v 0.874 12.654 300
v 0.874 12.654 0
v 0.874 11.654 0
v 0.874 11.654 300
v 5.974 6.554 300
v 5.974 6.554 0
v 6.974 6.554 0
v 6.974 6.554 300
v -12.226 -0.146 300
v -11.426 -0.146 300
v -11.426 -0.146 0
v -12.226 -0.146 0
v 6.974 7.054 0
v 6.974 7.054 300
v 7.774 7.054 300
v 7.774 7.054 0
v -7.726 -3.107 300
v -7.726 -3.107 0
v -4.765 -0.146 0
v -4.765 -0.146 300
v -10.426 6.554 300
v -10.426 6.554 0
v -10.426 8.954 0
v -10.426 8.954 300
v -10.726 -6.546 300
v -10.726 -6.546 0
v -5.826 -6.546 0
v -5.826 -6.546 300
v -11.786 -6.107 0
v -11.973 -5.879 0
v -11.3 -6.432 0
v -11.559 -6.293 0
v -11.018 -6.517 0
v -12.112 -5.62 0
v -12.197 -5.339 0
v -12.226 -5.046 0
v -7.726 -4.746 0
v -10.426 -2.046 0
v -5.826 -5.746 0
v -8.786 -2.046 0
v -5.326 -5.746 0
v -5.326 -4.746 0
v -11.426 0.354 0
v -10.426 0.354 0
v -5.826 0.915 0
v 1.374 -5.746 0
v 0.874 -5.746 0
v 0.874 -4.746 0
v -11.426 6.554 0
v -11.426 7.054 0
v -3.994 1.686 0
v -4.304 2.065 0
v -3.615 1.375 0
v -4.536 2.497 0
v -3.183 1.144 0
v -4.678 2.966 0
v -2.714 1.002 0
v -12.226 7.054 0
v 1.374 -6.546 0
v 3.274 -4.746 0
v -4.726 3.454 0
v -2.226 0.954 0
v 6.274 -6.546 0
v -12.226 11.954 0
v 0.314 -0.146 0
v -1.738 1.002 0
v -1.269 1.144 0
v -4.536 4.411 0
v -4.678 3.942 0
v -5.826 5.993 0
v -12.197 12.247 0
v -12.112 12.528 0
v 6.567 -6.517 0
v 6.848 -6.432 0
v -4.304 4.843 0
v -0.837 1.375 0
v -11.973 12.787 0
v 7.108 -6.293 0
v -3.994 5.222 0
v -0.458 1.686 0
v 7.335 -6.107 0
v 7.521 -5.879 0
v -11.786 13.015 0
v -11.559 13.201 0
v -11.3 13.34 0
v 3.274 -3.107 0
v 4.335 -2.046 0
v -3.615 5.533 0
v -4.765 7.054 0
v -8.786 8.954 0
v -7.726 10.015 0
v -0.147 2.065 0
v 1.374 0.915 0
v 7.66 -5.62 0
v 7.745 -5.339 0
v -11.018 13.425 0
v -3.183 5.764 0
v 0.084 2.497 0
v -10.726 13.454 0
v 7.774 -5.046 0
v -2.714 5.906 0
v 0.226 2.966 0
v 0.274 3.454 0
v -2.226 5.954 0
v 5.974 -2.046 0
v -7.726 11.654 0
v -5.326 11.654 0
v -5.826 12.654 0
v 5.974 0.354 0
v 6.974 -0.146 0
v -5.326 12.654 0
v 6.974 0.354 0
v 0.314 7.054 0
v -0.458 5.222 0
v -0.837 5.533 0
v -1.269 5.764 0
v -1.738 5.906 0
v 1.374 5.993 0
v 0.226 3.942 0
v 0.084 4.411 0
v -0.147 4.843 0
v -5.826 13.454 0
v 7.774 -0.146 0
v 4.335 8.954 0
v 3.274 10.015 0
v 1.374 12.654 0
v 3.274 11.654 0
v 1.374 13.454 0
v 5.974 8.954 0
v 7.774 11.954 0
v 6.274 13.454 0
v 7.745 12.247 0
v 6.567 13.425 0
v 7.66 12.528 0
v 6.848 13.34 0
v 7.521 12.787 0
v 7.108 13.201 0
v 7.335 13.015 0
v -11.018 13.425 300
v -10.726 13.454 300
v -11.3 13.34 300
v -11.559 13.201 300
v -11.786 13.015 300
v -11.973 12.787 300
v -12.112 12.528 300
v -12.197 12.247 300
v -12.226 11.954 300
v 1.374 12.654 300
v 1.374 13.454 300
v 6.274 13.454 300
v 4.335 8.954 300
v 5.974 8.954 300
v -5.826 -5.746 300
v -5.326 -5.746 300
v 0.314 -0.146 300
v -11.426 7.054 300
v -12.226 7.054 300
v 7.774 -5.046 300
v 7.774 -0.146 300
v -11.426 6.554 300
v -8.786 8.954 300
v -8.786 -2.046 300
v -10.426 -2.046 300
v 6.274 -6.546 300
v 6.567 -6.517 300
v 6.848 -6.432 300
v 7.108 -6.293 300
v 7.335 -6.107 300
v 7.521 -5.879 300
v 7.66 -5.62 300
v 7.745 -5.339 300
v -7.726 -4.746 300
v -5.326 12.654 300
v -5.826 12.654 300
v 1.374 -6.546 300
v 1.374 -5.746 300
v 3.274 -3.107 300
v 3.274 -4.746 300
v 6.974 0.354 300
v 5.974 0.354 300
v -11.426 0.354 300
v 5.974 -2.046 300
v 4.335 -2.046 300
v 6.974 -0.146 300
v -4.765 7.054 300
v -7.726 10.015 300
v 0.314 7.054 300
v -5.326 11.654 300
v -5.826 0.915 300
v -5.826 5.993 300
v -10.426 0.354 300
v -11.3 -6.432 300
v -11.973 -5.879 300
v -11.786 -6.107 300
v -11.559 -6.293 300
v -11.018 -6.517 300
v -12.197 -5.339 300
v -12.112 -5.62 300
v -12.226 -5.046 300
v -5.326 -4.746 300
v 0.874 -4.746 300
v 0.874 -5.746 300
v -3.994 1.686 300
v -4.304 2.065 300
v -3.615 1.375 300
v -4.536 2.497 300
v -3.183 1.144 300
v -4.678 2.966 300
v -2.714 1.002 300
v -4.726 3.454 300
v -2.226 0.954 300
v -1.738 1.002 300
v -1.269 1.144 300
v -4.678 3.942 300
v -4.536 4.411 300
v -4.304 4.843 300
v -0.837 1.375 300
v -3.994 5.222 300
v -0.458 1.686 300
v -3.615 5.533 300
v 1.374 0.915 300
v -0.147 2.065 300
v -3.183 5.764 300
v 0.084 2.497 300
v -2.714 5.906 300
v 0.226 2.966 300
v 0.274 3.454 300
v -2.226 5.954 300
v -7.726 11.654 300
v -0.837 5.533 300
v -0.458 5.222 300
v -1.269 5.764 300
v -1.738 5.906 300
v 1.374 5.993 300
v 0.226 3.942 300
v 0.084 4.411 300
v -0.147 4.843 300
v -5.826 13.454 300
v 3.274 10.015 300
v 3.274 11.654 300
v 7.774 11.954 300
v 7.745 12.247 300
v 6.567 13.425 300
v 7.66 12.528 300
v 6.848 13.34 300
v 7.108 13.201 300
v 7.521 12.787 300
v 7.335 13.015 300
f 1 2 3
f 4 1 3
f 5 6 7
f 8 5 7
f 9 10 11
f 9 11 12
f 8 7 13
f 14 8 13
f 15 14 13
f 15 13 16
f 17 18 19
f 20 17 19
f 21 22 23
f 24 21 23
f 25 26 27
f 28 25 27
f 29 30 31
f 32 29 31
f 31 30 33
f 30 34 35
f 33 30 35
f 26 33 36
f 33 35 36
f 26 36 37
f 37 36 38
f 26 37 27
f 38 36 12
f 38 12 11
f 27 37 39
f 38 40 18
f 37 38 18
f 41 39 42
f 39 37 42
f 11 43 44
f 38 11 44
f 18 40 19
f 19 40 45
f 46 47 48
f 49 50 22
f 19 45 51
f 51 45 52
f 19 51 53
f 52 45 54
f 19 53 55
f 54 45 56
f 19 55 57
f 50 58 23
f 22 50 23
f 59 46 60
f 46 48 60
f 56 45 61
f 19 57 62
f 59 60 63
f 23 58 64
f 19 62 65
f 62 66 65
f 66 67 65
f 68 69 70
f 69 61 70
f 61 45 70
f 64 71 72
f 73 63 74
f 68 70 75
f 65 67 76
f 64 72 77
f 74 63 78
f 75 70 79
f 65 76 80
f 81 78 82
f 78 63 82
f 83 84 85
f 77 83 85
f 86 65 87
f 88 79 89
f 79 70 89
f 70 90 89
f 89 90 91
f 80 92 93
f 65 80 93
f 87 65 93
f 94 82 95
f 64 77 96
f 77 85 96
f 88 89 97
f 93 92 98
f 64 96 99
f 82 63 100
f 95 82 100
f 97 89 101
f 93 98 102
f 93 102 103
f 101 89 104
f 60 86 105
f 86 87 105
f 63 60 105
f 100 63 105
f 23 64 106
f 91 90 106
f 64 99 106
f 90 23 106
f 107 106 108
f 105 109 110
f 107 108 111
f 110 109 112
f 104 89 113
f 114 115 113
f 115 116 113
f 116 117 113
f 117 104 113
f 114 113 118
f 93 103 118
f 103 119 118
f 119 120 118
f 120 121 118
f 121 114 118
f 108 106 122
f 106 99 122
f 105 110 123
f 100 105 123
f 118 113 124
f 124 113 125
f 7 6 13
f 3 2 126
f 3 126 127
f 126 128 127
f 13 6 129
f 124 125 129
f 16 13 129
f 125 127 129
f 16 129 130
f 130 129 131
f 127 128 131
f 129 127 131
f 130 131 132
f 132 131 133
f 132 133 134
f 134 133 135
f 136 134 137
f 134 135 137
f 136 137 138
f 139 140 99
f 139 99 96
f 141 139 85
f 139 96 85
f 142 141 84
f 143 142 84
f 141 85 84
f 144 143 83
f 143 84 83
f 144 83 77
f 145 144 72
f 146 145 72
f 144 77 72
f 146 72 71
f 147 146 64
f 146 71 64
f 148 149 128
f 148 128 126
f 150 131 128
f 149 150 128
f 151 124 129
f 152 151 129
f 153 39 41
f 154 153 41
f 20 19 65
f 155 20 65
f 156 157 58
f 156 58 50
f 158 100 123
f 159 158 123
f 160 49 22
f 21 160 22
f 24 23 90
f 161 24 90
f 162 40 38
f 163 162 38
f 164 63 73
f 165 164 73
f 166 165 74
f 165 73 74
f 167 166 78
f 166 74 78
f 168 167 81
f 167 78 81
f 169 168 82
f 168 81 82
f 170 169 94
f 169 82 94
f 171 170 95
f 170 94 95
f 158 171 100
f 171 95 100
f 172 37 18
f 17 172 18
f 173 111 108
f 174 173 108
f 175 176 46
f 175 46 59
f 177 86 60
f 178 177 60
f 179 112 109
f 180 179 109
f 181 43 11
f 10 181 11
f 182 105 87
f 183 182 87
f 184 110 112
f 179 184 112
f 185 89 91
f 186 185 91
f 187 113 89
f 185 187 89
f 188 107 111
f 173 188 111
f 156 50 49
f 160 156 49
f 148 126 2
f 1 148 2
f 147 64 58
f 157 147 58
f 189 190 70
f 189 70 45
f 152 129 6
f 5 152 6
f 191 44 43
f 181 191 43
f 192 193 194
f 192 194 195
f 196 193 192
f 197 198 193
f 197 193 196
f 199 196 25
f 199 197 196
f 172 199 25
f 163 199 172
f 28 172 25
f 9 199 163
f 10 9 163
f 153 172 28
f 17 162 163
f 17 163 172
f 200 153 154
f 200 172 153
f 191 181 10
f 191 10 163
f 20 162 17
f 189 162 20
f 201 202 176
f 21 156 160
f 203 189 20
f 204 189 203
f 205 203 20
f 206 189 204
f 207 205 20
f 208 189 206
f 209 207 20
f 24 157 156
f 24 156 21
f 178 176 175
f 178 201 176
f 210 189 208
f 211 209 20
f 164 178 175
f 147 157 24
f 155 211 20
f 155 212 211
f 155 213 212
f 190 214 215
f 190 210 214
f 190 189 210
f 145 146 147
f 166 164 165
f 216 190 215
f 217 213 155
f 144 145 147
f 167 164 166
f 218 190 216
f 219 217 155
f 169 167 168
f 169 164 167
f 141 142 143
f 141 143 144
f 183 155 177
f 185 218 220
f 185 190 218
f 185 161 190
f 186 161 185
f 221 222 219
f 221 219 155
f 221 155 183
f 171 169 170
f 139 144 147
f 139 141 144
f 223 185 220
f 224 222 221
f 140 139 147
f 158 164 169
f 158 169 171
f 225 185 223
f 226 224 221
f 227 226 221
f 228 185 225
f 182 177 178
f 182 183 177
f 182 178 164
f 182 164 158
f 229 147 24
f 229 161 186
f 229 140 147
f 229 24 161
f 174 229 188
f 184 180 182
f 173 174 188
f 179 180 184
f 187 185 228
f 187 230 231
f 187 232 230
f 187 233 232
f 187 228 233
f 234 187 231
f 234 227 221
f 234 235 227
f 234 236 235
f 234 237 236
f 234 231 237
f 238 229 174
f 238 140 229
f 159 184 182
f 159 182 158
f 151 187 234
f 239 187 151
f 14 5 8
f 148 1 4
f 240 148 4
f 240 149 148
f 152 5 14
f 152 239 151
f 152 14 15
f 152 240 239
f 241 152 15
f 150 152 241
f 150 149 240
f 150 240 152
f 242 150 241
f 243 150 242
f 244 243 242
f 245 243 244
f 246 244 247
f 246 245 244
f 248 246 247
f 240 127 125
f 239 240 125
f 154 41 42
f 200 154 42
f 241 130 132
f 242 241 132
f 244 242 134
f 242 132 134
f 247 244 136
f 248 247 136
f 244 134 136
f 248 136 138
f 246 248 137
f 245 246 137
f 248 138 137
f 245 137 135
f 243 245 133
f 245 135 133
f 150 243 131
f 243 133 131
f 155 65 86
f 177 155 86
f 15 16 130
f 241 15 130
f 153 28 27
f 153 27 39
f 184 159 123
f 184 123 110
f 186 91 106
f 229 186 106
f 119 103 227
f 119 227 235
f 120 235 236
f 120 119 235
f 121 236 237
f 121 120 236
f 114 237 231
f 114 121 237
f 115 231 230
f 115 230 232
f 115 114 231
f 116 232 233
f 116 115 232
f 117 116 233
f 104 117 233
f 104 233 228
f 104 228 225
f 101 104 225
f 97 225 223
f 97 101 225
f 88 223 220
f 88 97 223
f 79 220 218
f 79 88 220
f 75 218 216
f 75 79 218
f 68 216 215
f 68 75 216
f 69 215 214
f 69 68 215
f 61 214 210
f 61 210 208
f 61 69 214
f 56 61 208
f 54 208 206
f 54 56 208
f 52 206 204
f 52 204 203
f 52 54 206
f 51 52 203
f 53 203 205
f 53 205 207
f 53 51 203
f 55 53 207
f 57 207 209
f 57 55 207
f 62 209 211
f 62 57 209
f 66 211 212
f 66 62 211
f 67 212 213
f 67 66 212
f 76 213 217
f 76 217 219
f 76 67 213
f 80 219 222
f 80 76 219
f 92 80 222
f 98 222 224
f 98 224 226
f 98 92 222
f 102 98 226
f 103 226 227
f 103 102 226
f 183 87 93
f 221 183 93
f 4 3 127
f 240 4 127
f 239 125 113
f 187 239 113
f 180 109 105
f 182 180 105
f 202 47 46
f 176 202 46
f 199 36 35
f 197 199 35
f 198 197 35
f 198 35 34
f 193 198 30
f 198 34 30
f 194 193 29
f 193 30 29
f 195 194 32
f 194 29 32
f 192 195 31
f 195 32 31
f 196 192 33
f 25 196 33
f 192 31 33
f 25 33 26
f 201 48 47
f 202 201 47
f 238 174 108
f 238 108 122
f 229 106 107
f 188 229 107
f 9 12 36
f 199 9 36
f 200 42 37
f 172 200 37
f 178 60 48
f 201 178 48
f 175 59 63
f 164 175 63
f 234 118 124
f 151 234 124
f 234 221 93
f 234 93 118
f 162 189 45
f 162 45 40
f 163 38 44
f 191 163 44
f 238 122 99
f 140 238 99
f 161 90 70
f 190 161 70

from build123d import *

# Parameters (mm, degrees)
SKETCH_2_R      = 2.5
EXTRUDE_1_DEPTH = 300


with BuildPart() as part:
    # 草图2 → 凸台-拉伸1 (new body)
    with BuildSketch(Plane.XY):
        with BuildLine():
            Line((-5.825824942, 5.993206118), (-5.825824942, 0.914526462))
            Line((-5.825824942, 0.914526462), (-8.786485114, -2.04613371))
            Line((-8.786485114, -2.04613371), (-10.425824942, -2.04613371))
            Line((-10.425824942, -2.04613371), (-10.425824942, 0.35386629))
            Line((-10.425824942, 0.35386629), (-11.425824942, 0.35386629))
            Line((-11.425824942, 0.35386629), (-11.425824942, -0.14613371))
            Line((-11.425824942, -0.14613371), (-12.225824942, -0.14613371))
            Line((-12.225824942, -0.14613371), (-12.225824942, -5.04613371))
            ThreePointArc((-12.225824942, -5.04613371), (-11.786485114, -6.106793882), (-10.725824942, -6.54613371))
            Line((-10.725824942, -6.54613371), (-5.825824942, -6.54613371))
            Line((-5.825824942, -6.54613371), (-5.825824942, -5.74613371))
            Line((-5.825824942, -5.74613371), (-5.325824942, -5.74613371))
            Line((-5.325824942, -5.74613371), (-5.325824942, -4.74613371))
            Line((-5.325824942, -4.74613371), (-7.725824942, -4.74613371))
            Line((-7.725824942, -4.74613371), (-7.725824942, -3.106793882))
            Line((-7.725824942, -3.106793882), (-4.765164771, -0.14613371))
            Line((-4.765164771, -0.14613371), (0.313514886, -0.14613371))
            Line((0.313514886, -0.14613371), (3.274175058, -3.106793882))
            Line((3.274175058, -3.106793882), (3.274175058, -4.74613371))
            Line((3.274175058, -4.74613371), (0.874175058, -4.74613371))
            Line((0.874175058, -4.74613371), (0.874175058, -5.74613371))
            Line((0.874175058, -5.74613371), (1.374175058, -5.74613371))
            Line((1.374175058, -5.74613371), (1.374175058, -6.54613371))
            Line((1.374175058, -6.54613371), (6.274175058, -6.54613371))
            ThreePointArc((6.274175058, -6.54613371), (7.334835229, -6.106793882), (7.774175058, -5.04613371))
            Line((7.774175058, -5.04613371), (7.774175058, -0.14613371))
            Line((7.774175058, -0.14613371), (6.974175058, -0.14613371))
            Line((6.974175058, -0.14613371), (6.974175058, 0.35386629))
            Line((6.974175058, 0.35386629), (5.974175058, 0.35386629))
            Line((5.974175058, 0.35386629), (5.974175058, -2.04613371))
            Line((5.974175058, -2.04613371), (4.334835229, -2.04613371))
            Line((4.334835229, -2.04613371), (1.374175058, 0.914526462))
            Line((1.374175058, 0.914526462), (1.374175058, 5.993206118))
            Line((1.374175058, 5.993206118), (4.334835229, 8.95386629))
            Line((4.334835229, 8.95386629), (5.974175058, 8.95386629))
            Line((5.974175058, 8.95386629), (5.974175058, 6.55386629))
            Line((5.974175058, 6.55386629), (6.974175058, 6.55386629))
            Line((6.974175058, 6.55386629), (6.974175058, 7.05386629))
            Line((6.974175058, 7.05386629), (7.774175058, 7.05386629))
            Line((7.774175058, 7.05386629), (7.774175058, 11.95386629))
            ThreePointArc((7.774175058, 11.95386629), (7.334835229, 13.014526462), (6.274175058, 13.45386629))
            Line((6.274175058, 13.45386629), (1.374175058, 13.45386629))
            Line((1.374175058, 13.45386629), (1.374175058, 12.65386629))
            Line((1.374175058, 12.65386629), (0.874175058, 12.65386629))
            Line((0.874175058, 12.65386629), (0.874175058, 11.65386629))
            Line((0.874175058, 11.65386629), (3.274175058, 11.65386629))
            Line((3.274175058, 11.65386629), (3.274175058, 10.014526462))
            Line((3.274175058, 10.014526462), (0.313514886, 7.05386629))
            Line((0.313514886, 7.05386629), (-4.765164771, 7.05386629))
            Line((-4.765164771, 7.05386629), (-7.725824942, 10.014526462))
            Line((-7.725824942, 10.014526462), (-7.725824942, 11.65386629))
            Line((-7.725824942, 11.65386629), (-5.325824942, 11.65386629))
            Line((-5.325824942, 11.65386629), (-5.325824942, 12.65386629))
            Line((-5.325824942, 12.65386629), (-5.825824942, 12.65386629))
            Line((-5.825824942, 12.65386629), (-5.825824942, 13.45386629))
            Line((-5.825824942, 13.45386629), (-10.725824942, 13.45386629))
            ThreePointArc((-10.725824942, 13.45386629), (-11.786485114, 13.014526462), (-12.225824942, 11.95386629))
            Line((-12.225824942, 11.95386629), (-12.225824942, 7.05386629))
            Line((-12.225824942, 7.05386629), (-11.425824942, 7.05386629))
            Line((-11.425824942, 7.05386629), (-11.425824942, 6.55386629))
            Line((-11.425824942, 6.55386629), (-10.425824942, 6.55386629))
            Line((-10.425824942, 6.55386629), (-10.425824942, 8.95386629))
            Line((-10.425824942, 8.95386629), (-8.786485114, 8.95386629))
            Line((-8.786485114, 8.95386629), (-5.825824942, 5.993206118))
        make_face()
        with Locations((-2.225824942, 3.45386629)):
            Circle(SKETCH_2_R, mode=Mode.SUBTRACT)
    extrude(amount=EXTRUDE_1_DEPTH)


solid = part.part
